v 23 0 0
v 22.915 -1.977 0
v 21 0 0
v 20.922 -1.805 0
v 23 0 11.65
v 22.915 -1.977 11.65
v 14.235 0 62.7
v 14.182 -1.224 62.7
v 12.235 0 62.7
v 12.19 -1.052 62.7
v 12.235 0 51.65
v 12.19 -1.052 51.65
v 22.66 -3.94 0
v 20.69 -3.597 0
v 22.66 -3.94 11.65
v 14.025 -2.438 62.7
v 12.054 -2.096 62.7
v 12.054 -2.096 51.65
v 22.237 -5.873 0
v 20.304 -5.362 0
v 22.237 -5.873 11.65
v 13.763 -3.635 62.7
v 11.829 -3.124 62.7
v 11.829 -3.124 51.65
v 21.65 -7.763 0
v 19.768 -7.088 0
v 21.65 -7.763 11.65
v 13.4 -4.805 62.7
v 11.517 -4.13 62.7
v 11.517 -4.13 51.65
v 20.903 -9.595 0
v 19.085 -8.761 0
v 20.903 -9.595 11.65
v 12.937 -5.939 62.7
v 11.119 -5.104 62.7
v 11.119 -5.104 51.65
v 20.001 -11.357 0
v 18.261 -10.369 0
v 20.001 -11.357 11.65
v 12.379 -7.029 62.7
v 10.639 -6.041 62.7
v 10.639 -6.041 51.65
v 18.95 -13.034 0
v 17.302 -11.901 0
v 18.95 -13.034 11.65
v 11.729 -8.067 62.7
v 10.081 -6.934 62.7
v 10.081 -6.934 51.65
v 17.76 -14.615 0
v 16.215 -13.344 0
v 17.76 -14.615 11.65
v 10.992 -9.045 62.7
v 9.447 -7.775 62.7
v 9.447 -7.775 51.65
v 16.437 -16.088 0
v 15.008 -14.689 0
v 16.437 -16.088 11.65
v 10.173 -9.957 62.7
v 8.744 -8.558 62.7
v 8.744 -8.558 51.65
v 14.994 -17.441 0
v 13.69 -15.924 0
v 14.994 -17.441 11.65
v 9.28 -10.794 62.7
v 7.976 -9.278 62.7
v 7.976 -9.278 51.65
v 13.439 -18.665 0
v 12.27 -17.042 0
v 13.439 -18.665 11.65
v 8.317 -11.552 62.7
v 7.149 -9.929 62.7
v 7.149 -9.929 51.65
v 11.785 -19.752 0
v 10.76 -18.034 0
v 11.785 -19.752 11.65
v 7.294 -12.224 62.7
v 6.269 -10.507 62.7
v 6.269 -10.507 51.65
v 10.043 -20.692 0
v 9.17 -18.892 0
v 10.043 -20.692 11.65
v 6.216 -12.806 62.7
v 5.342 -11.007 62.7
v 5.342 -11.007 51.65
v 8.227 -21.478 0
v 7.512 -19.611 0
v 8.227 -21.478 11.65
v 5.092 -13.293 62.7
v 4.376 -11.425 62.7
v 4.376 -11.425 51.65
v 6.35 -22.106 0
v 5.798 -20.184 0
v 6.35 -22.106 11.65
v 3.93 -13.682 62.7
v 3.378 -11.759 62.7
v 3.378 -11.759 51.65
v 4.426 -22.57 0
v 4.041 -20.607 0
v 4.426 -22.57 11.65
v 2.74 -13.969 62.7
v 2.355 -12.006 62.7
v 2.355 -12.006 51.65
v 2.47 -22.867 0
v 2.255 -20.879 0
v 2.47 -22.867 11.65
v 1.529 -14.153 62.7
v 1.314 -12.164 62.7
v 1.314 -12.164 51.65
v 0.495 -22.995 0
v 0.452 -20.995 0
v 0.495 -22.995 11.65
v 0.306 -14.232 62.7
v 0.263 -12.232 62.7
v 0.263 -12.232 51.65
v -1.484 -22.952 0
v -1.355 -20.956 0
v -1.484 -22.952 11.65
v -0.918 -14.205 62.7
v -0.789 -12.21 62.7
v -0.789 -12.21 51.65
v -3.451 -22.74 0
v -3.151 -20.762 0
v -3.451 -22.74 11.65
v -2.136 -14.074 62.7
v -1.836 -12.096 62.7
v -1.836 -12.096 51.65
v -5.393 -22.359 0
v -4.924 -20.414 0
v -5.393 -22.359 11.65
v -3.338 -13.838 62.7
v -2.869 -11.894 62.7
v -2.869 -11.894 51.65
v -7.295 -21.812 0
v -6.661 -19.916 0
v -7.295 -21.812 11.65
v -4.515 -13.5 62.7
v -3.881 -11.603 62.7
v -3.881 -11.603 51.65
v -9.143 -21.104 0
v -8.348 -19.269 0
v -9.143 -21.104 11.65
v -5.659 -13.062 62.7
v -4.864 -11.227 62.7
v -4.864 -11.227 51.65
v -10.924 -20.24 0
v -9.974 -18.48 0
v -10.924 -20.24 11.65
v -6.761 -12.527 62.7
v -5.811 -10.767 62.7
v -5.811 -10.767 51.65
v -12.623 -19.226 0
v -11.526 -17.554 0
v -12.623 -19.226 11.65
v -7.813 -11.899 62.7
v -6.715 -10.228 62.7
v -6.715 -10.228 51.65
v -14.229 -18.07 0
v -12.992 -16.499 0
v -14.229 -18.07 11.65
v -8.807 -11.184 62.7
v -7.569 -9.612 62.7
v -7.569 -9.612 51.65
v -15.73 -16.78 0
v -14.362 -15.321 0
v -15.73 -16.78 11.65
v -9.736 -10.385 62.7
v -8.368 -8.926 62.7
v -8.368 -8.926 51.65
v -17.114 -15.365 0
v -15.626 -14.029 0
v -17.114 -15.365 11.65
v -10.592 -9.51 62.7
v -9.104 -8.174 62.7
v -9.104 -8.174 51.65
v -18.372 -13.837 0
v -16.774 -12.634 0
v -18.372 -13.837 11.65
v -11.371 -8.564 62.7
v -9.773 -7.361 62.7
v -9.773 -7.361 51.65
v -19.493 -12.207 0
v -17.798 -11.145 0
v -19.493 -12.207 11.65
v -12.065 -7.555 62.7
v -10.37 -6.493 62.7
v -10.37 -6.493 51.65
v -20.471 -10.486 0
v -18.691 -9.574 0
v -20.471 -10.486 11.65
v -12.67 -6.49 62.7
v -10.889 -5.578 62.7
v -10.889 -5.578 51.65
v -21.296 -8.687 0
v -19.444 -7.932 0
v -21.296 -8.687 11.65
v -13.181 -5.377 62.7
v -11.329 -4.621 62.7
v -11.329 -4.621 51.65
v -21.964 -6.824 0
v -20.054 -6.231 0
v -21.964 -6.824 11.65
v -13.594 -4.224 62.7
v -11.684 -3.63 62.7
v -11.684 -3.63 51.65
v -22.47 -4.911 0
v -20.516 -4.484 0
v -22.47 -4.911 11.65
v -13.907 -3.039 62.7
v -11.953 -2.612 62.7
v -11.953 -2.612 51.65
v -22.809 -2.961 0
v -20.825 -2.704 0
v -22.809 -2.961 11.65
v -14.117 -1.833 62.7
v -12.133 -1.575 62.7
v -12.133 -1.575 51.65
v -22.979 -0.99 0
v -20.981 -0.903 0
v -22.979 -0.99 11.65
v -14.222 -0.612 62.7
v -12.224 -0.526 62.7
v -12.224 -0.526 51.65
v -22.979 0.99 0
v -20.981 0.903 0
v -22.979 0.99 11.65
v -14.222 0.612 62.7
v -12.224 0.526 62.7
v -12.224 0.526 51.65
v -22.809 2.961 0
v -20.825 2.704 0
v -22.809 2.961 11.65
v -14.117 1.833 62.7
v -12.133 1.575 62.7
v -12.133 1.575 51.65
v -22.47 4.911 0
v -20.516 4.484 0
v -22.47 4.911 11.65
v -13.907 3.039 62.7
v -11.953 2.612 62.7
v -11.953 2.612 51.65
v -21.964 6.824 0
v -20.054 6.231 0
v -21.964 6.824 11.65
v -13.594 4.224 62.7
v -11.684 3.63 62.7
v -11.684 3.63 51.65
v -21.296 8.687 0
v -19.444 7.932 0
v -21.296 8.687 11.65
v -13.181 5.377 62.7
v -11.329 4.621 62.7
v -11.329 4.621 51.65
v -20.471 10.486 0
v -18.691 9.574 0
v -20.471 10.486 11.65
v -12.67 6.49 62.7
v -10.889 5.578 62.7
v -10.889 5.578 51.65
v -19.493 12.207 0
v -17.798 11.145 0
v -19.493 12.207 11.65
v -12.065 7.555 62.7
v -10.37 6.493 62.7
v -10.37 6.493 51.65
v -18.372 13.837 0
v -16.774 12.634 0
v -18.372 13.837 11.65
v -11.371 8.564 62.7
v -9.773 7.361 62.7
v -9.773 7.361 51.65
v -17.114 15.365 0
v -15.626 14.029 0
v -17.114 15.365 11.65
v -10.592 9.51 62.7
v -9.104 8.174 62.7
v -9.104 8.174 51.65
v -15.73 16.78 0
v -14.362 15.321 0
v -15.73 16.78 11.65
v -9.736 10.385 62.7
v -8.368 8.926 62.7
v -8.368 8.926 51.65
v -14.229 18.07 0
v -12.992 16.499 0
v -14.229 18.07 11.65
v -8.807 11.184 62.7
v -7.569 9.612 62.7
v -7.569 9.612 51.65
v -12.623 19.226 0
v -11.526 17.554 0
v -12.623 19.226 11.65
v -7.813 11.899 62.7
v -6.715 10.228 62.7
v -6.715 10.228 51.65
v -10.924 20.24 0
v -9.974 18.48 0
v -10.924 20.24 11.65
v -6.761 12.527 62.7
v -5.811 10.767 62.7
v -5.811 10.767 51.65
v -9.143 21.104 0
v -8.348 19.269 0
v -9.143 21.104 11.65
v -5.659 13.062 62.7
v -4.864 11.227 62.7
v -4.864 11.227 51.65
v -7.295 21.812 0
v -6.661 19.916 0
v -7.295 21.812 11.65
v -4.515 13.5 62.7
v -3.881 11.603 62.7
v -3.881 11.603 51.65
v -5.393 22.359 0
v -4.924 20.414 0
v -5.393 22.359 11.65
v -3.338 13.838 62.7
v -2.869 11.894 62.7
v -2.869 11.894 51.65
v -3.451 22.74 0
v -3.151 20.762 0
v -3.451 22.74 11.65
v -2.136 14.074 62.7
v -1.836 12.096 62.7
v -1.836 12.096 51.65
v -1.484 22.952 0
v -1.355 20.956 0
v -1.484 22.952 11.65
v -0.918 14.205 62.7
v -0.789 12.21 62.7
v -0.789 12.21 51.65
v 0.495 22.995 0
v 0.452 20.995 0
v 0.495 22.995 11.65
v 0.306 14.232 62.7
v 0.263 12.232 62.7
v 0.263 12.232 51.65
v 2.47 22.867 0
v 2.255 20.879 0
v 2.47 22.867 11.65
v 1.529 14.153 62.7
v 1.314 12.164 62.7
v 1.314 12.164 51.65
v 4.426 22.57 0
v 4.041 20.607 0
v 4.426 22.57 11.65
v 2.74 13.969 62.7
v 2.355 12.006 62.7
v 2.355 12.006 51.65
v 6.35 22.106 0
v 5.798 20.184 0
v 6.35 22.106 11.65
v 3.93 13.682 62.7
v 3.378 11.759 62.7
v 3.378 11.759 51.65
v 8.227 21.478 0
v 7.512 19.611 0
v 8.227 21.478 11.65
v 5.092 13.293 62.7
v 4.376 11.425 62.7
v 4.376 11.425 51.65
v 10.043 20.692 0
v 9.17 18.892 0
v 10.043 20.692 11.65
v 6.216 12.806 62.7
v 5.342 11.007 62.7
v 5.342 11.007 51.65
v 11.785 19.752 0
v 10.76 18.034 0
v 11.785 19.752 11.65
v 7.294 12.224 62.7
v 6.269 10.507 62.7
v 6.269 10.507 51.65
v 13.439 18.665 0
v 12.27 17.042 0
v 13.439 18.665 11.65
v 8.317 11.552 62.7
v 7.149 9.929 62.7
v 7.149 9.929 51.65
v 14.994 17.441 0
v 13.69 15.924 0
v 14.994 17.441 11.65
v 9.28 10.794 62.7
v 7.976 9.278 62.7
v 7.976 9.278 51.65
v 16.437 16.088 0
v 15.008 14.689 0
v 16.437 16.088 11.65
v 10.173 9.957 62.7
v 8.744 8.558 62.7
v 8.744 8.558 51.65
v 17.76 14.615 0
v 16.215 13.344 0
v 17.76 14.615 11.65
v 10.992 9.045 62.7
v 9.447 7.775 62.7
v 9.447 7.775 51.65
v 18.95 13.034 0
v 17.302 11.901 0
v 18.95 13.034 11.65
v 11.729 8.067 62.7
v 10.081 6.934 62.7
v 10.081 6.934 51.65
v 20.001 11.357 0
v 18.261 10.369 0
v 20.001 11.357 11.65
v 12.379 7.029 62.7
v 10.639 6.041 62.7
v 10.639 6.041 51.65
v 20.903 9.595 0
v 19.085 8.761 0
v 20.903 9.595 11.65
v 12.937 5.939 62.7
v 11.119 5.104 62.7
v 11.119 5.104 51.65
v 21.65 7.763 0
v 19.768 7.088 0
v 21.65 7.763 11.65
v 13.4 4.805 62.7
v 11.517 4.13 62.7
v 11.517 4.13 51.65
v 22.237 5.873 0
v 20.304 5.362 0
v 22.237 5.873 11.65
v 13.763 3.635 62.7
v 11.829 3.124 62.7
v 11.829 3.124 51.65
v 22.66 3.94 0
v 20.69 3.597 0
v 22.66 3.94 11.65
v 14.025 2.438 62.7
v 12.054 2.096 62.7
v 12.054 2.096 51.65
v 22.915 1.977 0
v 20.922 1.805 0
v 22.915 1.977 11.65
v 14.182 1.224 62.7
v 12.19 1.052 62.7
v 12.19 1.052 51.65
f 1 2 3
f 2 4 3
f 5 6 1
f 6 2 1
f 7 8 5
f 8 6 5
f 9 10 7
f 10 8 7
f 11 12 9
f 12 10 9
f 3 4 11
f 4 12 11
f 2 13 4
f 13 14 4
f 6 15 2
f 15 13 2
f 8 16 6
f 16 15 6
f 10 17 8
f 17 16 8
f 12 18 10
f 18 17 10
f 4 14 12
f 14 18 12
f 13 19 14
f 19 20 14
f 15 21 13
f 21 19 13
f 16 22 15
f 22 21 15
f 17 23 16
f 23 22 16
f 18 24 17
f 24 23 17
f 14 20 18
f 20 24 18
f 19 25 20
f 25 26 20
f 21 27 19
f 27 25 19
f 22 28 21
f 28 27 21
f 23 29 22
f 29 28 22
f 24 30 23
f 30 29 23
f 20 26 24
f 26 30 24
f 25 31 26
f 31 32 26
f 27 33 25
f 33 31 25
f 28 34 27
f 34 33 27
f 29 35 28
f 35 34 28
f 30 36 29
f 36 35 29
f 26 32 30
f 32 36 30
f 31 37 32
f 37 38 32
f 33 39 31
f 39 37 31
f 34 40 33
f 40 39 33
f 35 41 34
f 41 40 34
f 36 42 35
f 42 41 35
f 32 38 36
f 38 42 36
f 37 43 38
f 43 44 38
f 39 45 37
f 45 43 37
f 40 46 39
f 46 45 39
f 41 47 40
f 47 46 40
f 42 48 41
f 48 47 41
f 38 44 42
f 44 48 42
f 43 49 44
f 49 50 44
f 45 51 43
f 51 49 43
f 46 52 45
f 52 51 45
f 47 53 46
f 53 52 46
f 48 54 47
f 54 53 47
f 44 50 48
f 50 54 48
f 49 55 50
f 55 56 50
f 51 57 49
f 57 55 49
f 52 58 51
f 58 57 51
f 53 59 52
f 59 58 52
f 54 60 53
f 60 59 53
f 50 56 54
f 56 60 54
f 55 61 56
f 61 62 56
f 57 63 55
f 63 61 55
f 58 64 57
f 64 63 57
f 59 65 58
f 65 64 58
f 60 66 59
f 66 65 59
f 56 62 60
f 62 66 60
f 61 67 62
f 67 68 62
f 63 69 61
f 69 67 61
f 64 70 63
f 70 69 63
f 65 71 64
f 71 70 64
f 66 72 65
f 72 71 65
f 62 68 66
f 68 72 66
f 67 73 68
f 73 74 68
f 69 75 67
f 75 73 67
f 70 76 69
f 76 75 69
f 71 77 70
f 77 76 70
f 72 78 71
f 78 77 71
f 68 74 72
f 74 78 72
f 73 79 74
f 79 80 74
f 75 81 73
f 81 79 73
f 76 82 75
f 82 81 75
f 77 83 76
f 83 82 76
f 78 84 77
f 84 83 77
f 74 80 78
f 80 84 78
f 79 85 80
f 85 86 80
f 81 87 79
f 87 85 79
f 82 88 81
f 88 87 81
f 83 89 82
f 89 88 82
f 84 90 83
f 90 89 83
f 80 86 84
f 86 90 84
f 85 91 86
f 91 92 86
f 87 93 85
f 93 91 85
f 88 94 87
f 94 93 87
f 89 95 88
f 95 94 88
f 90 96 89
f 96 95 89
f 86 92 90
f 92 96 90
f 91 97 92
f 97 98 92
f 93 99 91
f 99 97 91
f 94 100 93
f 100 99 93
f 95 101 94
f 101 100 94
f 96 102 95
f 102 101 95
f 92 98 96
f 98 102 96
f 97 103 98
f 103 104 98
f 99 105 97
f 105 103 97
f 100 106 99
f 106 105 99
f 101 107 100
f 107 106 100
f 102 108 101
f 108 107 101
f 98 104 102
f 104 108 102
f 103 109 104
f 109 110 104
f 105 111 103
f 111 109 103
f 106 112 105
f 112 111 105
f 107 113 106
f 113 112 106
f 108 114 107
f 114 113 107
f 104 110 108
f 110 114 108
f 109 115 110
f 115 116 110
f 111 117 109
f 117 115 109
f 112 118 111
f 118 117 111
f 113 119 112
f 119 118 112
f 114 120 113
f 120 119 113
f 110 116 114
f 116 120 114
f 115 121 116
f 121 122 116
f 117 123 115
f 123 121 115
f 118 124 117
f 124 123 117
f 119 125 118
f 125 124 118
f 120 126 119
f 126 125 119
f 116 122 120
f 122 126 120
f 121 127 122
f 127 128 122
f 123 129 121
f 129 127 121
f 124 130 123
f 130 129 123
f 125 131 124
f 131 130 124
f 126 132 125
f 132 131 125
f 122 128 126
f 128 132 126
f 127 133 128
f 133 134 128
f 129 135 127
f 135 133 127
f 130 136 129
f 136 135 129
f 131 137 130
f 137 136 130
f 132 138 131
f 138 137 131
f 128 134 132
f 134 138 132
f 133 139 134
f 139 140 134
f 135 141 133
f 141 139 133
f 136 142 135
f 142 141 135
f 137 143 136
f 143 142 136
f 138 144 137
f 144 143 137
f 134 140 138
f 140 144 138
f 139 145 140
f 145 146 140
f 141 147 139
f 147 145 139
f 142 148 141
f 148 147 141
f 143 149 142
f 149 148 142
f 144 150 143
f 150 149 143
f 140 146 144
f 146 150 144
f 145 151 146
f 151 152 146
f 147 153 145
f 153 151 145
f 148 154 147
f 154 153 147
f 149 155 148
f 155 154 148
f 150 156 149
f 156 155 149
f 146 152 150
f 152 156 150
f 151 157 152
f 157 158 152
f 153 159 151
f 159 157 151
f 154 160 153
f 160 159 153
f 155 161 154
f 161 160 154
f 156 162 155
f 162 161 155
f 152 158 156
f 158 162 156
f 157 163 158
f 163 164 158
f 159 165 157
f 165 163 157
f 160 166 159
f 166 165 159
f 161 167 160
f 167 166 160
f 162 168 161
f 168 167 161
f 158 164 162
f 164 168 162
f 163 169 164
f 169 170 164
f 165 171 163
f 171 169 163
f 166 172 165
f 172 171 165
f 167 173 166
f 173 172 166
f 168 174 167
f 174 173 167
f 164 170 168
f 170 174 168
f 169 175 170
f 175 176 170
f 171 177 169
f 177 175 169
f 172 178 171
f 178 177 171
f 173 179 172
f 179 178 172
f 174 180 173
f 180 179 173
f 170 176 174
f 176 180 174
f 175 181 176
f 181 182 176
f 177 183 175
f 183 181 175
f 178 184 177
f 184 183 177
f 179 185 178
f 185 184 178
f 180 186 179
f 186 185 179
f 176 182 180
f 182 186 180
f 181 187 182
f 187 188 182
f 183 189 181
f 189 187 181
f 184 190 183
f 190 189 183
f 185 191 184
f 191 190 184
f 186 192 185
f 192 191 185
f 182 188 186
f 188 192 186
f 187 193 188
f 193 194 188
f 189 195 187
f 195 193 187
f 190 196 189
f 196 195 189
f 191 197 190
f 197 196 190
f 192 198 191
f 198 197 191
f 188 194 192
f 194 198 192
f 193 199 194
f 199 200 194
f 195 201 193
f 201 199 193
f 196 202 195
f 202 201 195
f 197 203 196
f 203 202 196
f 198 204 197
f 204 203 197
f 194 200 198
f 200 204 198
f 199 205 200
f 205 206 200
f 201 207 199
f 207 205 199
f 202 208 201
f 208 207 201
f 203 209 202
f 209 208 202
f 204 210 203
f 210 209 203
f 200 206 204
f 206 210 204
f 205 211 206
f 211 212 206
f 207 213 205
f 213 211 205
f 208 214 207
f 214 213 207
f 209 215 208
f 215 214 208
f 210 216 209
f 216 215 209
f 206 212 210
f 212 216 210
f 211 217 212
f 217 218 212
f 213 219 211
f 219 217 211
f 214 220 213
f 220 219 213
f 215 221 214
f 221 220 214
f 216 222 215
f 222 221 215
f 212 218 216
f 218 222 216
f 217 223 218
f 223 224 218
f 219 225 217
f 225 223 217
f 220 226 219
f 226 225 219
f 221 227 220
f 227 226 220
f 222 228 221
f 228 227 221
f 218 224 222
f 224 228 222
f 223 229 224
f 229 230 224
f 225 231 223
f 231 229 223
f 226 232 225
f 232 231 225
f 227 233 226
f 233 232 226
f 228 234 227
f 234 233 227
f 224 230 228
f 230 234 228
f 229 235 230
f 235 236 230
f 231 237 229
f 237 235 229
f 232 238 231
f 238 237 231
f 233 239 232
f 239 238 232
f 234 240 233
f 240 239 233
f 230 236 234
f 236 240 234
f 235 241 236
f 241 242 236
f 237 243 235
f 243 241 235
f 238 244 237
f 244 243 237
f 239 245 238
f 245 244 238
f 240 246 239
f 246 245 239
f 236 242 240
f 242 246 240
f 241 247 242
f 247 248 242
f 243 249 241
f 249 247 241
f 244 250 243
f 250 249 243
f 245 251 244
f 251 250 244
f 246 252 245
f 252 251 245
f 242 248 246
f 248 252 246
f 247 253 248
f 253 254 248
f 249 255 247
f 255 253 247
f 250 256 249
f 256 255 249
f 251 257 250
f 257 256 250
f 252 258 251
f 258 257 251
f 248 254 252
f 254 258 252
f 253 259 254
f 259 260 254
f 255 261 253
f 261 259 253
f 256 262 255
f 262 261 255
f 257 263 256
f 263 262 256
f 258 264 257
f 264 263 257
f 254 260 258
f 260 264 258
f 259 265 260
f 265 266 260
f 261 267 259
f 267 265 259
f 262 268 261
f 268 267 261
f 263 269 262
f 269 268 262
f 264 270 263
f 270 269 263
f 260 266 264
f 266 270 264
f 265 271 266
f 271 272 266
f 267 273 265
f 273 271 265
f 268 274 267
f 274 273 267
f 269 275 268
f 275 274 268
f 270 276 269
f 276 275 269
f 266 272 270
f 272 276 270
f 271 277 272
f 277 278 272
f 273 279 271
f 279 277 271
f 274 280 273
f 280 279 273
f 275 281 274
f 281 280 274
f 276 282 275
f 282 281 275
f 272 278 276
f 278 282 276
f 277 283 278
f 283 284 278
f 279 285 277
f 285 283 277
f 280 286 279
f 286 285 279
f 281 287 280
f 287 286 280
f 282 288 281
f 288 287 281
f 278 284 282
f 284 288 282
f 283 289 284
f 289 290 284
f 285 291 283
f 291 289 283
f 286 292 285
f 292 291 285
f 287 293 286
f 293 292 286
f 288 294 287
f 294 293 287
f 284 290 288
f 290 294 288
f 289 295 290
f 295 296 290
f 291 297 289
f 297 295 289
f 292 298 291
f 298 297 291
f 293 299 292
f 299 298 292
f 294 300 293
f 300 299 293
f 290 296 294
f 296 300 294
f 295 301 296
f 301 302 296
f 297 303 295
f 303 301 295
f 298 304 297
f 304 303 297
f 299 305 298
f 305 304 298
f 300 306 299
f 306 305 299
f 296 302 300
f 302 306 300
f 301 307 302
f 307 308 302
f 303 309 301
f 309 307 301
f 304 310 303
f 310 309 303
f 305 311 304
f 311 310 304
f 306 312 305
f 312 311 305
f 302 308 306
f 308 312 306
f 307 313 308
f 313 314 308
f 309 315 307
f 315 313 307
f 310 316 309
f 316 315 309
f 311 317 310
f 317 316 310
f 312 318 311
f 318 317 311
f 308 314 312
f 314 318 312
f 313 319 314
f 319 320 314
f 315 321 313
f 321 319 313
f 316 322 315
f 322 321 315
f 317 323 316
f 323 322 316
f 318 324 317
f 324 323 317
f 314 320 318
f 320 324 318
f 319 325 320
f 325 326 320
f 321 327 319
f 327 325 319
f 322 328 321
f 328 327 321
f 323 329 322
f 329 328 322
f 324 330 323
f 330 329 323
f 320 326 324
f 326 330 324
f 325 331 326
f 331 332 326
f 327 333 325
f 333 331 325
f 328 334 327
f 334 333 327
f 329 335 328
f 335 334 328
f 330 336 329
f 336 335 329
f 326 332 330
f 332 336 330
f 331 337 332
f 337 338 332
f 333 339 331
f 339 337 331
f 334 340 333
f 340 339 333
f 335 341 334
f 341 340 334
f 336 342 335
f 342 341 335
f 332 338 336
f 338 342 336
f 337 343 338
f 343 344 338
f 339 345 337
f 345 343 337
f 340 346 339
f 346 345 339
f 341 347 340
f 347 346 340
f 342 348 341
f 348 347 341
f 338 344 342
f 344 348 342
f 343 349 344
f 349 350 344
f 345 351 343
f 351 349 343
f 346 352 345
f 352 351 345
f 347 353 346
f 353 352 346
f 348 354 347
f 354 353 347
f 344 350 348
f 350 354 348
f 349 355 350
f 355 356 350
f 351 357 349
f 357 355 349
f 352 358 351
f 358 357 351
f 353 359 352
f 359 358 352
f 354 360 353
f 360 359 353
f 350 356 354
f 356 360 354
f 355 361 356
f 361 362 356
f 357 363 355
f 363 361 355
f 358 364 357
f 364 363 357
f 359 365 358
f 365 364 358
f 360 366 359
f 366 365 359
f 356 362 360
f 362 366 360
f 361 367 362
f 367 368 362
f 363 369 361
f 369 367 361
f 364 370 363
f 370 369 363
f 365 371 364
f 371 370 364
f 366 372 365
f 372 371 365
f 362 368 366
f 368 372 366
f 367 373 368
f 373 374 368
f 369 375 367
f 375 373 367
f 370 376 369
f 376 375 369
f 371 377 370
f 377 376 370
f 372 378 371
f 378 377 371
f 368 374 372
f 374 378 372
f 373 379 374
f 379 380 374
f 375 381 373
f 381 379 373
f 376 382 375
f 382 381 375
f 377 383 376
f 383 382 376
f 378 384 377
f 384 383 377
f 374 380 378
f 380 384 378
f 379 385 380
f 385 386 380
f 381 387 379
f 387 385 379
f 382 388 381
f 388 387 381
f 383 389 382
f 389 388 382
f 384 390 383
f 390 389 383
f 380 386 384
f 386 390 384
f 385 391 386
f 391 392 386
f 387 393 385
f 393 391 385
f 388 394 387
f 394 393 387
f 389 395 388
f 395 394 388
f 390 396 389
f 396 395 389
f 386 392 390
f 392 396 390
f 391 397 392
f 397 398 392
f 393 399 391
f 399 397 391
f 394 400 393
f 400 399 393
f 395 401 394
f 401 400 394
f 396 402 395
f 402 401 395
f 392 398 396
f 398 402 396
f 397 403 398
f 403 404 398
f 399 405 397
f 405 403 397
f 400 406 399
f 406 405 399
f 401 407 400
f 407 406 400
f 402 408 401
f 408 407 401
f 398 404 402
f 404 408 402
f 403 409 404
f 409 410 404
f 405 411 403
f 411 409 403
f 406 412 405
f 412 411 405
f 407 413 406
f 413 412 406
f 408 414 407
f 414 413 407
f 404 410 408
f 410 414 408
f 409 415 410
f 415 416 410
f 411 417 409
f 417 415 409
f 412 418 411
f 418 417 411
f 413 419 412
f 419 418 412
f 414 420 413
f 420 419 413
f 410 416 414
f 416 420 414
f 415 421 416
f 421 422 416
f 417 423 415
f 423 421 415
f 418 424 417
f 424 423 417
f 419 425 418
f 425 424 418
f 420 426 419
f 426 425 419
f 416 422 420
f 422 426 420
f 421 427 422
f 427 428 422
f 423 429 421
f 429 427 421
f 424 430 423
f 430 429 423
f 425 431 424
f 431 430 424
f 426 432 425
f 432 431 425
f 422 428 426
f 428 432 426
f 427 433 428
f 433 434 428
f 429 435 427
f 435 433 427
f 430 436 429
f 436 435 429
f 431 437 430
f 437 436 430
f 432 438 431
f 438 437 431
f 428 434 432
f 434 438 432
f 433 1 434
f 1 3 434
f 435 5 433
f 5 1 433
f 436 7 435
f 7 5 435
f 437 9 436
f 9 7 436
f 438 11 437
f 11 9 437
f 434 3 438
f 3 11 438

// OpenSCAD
// an adapter tube to use a surplus projector lens ("WIKO 100-150mm f3.5") and surplus eyepiece ("H-6mm")

eps = 0.01;

proj_lens_OD = 52.5;
proj_lens_ID = 46.0;
proj_lens_inner_clr = 23.3;
proj_lens_outer_clr = 5;

eyepiece_OD = 24.47;
eyepiece_ID = 21.7;
eyepiece_inner_clr = 6.31;
eyepiece_outer_clr = 22.1;

// approx spacing between end of tubes is 40mm ("freespace gap")
// max clearance would then be ~70mm

/*
      _    _
     / |  | \         \___ (inner) flat surface for mating with eyepiece
    /  |  |  \        /
   /  /    \  \
  /  /      \  \
 |  /        \  |     \____ flat surface for mating with ID of projector lens
 |_/          \_|     /

(diagram not to scale)
*/

module profile() {
    thickness = 2;
    freespace_gap = 40;
    proj_lens_flat_surface = proj_lens_inner_clr / 2;
    eyepiece_flat_surface = eyepiece_outer_clr / 2;
    points = [
        [-proj_lens_ID/2, 0],
        [-proj_lens_ID/2 + thickness, 0],
        [-eyepiece_OD/2, proj_lens_flat_surface+freespace_gap],
        [-eyepiece_OD/2, proj_lens_flat_surface+freespace_gap+eyepiece_flat_surface],
        [-eyepiece_OD/2-thickness, proj_lens_flat_surface+freespace_gap+eyepiece_flat_surface],
        [-proj_lens_ID/2, proj_lens_flat_surface]
    ];

    polygon(points);
}


// TODO
// 1. consider method to change length for focusing
// as-is, this takes 21.4g / 7m of filament and 1h16m to print
$fa=1;
rotate_extrude()
    profile();
